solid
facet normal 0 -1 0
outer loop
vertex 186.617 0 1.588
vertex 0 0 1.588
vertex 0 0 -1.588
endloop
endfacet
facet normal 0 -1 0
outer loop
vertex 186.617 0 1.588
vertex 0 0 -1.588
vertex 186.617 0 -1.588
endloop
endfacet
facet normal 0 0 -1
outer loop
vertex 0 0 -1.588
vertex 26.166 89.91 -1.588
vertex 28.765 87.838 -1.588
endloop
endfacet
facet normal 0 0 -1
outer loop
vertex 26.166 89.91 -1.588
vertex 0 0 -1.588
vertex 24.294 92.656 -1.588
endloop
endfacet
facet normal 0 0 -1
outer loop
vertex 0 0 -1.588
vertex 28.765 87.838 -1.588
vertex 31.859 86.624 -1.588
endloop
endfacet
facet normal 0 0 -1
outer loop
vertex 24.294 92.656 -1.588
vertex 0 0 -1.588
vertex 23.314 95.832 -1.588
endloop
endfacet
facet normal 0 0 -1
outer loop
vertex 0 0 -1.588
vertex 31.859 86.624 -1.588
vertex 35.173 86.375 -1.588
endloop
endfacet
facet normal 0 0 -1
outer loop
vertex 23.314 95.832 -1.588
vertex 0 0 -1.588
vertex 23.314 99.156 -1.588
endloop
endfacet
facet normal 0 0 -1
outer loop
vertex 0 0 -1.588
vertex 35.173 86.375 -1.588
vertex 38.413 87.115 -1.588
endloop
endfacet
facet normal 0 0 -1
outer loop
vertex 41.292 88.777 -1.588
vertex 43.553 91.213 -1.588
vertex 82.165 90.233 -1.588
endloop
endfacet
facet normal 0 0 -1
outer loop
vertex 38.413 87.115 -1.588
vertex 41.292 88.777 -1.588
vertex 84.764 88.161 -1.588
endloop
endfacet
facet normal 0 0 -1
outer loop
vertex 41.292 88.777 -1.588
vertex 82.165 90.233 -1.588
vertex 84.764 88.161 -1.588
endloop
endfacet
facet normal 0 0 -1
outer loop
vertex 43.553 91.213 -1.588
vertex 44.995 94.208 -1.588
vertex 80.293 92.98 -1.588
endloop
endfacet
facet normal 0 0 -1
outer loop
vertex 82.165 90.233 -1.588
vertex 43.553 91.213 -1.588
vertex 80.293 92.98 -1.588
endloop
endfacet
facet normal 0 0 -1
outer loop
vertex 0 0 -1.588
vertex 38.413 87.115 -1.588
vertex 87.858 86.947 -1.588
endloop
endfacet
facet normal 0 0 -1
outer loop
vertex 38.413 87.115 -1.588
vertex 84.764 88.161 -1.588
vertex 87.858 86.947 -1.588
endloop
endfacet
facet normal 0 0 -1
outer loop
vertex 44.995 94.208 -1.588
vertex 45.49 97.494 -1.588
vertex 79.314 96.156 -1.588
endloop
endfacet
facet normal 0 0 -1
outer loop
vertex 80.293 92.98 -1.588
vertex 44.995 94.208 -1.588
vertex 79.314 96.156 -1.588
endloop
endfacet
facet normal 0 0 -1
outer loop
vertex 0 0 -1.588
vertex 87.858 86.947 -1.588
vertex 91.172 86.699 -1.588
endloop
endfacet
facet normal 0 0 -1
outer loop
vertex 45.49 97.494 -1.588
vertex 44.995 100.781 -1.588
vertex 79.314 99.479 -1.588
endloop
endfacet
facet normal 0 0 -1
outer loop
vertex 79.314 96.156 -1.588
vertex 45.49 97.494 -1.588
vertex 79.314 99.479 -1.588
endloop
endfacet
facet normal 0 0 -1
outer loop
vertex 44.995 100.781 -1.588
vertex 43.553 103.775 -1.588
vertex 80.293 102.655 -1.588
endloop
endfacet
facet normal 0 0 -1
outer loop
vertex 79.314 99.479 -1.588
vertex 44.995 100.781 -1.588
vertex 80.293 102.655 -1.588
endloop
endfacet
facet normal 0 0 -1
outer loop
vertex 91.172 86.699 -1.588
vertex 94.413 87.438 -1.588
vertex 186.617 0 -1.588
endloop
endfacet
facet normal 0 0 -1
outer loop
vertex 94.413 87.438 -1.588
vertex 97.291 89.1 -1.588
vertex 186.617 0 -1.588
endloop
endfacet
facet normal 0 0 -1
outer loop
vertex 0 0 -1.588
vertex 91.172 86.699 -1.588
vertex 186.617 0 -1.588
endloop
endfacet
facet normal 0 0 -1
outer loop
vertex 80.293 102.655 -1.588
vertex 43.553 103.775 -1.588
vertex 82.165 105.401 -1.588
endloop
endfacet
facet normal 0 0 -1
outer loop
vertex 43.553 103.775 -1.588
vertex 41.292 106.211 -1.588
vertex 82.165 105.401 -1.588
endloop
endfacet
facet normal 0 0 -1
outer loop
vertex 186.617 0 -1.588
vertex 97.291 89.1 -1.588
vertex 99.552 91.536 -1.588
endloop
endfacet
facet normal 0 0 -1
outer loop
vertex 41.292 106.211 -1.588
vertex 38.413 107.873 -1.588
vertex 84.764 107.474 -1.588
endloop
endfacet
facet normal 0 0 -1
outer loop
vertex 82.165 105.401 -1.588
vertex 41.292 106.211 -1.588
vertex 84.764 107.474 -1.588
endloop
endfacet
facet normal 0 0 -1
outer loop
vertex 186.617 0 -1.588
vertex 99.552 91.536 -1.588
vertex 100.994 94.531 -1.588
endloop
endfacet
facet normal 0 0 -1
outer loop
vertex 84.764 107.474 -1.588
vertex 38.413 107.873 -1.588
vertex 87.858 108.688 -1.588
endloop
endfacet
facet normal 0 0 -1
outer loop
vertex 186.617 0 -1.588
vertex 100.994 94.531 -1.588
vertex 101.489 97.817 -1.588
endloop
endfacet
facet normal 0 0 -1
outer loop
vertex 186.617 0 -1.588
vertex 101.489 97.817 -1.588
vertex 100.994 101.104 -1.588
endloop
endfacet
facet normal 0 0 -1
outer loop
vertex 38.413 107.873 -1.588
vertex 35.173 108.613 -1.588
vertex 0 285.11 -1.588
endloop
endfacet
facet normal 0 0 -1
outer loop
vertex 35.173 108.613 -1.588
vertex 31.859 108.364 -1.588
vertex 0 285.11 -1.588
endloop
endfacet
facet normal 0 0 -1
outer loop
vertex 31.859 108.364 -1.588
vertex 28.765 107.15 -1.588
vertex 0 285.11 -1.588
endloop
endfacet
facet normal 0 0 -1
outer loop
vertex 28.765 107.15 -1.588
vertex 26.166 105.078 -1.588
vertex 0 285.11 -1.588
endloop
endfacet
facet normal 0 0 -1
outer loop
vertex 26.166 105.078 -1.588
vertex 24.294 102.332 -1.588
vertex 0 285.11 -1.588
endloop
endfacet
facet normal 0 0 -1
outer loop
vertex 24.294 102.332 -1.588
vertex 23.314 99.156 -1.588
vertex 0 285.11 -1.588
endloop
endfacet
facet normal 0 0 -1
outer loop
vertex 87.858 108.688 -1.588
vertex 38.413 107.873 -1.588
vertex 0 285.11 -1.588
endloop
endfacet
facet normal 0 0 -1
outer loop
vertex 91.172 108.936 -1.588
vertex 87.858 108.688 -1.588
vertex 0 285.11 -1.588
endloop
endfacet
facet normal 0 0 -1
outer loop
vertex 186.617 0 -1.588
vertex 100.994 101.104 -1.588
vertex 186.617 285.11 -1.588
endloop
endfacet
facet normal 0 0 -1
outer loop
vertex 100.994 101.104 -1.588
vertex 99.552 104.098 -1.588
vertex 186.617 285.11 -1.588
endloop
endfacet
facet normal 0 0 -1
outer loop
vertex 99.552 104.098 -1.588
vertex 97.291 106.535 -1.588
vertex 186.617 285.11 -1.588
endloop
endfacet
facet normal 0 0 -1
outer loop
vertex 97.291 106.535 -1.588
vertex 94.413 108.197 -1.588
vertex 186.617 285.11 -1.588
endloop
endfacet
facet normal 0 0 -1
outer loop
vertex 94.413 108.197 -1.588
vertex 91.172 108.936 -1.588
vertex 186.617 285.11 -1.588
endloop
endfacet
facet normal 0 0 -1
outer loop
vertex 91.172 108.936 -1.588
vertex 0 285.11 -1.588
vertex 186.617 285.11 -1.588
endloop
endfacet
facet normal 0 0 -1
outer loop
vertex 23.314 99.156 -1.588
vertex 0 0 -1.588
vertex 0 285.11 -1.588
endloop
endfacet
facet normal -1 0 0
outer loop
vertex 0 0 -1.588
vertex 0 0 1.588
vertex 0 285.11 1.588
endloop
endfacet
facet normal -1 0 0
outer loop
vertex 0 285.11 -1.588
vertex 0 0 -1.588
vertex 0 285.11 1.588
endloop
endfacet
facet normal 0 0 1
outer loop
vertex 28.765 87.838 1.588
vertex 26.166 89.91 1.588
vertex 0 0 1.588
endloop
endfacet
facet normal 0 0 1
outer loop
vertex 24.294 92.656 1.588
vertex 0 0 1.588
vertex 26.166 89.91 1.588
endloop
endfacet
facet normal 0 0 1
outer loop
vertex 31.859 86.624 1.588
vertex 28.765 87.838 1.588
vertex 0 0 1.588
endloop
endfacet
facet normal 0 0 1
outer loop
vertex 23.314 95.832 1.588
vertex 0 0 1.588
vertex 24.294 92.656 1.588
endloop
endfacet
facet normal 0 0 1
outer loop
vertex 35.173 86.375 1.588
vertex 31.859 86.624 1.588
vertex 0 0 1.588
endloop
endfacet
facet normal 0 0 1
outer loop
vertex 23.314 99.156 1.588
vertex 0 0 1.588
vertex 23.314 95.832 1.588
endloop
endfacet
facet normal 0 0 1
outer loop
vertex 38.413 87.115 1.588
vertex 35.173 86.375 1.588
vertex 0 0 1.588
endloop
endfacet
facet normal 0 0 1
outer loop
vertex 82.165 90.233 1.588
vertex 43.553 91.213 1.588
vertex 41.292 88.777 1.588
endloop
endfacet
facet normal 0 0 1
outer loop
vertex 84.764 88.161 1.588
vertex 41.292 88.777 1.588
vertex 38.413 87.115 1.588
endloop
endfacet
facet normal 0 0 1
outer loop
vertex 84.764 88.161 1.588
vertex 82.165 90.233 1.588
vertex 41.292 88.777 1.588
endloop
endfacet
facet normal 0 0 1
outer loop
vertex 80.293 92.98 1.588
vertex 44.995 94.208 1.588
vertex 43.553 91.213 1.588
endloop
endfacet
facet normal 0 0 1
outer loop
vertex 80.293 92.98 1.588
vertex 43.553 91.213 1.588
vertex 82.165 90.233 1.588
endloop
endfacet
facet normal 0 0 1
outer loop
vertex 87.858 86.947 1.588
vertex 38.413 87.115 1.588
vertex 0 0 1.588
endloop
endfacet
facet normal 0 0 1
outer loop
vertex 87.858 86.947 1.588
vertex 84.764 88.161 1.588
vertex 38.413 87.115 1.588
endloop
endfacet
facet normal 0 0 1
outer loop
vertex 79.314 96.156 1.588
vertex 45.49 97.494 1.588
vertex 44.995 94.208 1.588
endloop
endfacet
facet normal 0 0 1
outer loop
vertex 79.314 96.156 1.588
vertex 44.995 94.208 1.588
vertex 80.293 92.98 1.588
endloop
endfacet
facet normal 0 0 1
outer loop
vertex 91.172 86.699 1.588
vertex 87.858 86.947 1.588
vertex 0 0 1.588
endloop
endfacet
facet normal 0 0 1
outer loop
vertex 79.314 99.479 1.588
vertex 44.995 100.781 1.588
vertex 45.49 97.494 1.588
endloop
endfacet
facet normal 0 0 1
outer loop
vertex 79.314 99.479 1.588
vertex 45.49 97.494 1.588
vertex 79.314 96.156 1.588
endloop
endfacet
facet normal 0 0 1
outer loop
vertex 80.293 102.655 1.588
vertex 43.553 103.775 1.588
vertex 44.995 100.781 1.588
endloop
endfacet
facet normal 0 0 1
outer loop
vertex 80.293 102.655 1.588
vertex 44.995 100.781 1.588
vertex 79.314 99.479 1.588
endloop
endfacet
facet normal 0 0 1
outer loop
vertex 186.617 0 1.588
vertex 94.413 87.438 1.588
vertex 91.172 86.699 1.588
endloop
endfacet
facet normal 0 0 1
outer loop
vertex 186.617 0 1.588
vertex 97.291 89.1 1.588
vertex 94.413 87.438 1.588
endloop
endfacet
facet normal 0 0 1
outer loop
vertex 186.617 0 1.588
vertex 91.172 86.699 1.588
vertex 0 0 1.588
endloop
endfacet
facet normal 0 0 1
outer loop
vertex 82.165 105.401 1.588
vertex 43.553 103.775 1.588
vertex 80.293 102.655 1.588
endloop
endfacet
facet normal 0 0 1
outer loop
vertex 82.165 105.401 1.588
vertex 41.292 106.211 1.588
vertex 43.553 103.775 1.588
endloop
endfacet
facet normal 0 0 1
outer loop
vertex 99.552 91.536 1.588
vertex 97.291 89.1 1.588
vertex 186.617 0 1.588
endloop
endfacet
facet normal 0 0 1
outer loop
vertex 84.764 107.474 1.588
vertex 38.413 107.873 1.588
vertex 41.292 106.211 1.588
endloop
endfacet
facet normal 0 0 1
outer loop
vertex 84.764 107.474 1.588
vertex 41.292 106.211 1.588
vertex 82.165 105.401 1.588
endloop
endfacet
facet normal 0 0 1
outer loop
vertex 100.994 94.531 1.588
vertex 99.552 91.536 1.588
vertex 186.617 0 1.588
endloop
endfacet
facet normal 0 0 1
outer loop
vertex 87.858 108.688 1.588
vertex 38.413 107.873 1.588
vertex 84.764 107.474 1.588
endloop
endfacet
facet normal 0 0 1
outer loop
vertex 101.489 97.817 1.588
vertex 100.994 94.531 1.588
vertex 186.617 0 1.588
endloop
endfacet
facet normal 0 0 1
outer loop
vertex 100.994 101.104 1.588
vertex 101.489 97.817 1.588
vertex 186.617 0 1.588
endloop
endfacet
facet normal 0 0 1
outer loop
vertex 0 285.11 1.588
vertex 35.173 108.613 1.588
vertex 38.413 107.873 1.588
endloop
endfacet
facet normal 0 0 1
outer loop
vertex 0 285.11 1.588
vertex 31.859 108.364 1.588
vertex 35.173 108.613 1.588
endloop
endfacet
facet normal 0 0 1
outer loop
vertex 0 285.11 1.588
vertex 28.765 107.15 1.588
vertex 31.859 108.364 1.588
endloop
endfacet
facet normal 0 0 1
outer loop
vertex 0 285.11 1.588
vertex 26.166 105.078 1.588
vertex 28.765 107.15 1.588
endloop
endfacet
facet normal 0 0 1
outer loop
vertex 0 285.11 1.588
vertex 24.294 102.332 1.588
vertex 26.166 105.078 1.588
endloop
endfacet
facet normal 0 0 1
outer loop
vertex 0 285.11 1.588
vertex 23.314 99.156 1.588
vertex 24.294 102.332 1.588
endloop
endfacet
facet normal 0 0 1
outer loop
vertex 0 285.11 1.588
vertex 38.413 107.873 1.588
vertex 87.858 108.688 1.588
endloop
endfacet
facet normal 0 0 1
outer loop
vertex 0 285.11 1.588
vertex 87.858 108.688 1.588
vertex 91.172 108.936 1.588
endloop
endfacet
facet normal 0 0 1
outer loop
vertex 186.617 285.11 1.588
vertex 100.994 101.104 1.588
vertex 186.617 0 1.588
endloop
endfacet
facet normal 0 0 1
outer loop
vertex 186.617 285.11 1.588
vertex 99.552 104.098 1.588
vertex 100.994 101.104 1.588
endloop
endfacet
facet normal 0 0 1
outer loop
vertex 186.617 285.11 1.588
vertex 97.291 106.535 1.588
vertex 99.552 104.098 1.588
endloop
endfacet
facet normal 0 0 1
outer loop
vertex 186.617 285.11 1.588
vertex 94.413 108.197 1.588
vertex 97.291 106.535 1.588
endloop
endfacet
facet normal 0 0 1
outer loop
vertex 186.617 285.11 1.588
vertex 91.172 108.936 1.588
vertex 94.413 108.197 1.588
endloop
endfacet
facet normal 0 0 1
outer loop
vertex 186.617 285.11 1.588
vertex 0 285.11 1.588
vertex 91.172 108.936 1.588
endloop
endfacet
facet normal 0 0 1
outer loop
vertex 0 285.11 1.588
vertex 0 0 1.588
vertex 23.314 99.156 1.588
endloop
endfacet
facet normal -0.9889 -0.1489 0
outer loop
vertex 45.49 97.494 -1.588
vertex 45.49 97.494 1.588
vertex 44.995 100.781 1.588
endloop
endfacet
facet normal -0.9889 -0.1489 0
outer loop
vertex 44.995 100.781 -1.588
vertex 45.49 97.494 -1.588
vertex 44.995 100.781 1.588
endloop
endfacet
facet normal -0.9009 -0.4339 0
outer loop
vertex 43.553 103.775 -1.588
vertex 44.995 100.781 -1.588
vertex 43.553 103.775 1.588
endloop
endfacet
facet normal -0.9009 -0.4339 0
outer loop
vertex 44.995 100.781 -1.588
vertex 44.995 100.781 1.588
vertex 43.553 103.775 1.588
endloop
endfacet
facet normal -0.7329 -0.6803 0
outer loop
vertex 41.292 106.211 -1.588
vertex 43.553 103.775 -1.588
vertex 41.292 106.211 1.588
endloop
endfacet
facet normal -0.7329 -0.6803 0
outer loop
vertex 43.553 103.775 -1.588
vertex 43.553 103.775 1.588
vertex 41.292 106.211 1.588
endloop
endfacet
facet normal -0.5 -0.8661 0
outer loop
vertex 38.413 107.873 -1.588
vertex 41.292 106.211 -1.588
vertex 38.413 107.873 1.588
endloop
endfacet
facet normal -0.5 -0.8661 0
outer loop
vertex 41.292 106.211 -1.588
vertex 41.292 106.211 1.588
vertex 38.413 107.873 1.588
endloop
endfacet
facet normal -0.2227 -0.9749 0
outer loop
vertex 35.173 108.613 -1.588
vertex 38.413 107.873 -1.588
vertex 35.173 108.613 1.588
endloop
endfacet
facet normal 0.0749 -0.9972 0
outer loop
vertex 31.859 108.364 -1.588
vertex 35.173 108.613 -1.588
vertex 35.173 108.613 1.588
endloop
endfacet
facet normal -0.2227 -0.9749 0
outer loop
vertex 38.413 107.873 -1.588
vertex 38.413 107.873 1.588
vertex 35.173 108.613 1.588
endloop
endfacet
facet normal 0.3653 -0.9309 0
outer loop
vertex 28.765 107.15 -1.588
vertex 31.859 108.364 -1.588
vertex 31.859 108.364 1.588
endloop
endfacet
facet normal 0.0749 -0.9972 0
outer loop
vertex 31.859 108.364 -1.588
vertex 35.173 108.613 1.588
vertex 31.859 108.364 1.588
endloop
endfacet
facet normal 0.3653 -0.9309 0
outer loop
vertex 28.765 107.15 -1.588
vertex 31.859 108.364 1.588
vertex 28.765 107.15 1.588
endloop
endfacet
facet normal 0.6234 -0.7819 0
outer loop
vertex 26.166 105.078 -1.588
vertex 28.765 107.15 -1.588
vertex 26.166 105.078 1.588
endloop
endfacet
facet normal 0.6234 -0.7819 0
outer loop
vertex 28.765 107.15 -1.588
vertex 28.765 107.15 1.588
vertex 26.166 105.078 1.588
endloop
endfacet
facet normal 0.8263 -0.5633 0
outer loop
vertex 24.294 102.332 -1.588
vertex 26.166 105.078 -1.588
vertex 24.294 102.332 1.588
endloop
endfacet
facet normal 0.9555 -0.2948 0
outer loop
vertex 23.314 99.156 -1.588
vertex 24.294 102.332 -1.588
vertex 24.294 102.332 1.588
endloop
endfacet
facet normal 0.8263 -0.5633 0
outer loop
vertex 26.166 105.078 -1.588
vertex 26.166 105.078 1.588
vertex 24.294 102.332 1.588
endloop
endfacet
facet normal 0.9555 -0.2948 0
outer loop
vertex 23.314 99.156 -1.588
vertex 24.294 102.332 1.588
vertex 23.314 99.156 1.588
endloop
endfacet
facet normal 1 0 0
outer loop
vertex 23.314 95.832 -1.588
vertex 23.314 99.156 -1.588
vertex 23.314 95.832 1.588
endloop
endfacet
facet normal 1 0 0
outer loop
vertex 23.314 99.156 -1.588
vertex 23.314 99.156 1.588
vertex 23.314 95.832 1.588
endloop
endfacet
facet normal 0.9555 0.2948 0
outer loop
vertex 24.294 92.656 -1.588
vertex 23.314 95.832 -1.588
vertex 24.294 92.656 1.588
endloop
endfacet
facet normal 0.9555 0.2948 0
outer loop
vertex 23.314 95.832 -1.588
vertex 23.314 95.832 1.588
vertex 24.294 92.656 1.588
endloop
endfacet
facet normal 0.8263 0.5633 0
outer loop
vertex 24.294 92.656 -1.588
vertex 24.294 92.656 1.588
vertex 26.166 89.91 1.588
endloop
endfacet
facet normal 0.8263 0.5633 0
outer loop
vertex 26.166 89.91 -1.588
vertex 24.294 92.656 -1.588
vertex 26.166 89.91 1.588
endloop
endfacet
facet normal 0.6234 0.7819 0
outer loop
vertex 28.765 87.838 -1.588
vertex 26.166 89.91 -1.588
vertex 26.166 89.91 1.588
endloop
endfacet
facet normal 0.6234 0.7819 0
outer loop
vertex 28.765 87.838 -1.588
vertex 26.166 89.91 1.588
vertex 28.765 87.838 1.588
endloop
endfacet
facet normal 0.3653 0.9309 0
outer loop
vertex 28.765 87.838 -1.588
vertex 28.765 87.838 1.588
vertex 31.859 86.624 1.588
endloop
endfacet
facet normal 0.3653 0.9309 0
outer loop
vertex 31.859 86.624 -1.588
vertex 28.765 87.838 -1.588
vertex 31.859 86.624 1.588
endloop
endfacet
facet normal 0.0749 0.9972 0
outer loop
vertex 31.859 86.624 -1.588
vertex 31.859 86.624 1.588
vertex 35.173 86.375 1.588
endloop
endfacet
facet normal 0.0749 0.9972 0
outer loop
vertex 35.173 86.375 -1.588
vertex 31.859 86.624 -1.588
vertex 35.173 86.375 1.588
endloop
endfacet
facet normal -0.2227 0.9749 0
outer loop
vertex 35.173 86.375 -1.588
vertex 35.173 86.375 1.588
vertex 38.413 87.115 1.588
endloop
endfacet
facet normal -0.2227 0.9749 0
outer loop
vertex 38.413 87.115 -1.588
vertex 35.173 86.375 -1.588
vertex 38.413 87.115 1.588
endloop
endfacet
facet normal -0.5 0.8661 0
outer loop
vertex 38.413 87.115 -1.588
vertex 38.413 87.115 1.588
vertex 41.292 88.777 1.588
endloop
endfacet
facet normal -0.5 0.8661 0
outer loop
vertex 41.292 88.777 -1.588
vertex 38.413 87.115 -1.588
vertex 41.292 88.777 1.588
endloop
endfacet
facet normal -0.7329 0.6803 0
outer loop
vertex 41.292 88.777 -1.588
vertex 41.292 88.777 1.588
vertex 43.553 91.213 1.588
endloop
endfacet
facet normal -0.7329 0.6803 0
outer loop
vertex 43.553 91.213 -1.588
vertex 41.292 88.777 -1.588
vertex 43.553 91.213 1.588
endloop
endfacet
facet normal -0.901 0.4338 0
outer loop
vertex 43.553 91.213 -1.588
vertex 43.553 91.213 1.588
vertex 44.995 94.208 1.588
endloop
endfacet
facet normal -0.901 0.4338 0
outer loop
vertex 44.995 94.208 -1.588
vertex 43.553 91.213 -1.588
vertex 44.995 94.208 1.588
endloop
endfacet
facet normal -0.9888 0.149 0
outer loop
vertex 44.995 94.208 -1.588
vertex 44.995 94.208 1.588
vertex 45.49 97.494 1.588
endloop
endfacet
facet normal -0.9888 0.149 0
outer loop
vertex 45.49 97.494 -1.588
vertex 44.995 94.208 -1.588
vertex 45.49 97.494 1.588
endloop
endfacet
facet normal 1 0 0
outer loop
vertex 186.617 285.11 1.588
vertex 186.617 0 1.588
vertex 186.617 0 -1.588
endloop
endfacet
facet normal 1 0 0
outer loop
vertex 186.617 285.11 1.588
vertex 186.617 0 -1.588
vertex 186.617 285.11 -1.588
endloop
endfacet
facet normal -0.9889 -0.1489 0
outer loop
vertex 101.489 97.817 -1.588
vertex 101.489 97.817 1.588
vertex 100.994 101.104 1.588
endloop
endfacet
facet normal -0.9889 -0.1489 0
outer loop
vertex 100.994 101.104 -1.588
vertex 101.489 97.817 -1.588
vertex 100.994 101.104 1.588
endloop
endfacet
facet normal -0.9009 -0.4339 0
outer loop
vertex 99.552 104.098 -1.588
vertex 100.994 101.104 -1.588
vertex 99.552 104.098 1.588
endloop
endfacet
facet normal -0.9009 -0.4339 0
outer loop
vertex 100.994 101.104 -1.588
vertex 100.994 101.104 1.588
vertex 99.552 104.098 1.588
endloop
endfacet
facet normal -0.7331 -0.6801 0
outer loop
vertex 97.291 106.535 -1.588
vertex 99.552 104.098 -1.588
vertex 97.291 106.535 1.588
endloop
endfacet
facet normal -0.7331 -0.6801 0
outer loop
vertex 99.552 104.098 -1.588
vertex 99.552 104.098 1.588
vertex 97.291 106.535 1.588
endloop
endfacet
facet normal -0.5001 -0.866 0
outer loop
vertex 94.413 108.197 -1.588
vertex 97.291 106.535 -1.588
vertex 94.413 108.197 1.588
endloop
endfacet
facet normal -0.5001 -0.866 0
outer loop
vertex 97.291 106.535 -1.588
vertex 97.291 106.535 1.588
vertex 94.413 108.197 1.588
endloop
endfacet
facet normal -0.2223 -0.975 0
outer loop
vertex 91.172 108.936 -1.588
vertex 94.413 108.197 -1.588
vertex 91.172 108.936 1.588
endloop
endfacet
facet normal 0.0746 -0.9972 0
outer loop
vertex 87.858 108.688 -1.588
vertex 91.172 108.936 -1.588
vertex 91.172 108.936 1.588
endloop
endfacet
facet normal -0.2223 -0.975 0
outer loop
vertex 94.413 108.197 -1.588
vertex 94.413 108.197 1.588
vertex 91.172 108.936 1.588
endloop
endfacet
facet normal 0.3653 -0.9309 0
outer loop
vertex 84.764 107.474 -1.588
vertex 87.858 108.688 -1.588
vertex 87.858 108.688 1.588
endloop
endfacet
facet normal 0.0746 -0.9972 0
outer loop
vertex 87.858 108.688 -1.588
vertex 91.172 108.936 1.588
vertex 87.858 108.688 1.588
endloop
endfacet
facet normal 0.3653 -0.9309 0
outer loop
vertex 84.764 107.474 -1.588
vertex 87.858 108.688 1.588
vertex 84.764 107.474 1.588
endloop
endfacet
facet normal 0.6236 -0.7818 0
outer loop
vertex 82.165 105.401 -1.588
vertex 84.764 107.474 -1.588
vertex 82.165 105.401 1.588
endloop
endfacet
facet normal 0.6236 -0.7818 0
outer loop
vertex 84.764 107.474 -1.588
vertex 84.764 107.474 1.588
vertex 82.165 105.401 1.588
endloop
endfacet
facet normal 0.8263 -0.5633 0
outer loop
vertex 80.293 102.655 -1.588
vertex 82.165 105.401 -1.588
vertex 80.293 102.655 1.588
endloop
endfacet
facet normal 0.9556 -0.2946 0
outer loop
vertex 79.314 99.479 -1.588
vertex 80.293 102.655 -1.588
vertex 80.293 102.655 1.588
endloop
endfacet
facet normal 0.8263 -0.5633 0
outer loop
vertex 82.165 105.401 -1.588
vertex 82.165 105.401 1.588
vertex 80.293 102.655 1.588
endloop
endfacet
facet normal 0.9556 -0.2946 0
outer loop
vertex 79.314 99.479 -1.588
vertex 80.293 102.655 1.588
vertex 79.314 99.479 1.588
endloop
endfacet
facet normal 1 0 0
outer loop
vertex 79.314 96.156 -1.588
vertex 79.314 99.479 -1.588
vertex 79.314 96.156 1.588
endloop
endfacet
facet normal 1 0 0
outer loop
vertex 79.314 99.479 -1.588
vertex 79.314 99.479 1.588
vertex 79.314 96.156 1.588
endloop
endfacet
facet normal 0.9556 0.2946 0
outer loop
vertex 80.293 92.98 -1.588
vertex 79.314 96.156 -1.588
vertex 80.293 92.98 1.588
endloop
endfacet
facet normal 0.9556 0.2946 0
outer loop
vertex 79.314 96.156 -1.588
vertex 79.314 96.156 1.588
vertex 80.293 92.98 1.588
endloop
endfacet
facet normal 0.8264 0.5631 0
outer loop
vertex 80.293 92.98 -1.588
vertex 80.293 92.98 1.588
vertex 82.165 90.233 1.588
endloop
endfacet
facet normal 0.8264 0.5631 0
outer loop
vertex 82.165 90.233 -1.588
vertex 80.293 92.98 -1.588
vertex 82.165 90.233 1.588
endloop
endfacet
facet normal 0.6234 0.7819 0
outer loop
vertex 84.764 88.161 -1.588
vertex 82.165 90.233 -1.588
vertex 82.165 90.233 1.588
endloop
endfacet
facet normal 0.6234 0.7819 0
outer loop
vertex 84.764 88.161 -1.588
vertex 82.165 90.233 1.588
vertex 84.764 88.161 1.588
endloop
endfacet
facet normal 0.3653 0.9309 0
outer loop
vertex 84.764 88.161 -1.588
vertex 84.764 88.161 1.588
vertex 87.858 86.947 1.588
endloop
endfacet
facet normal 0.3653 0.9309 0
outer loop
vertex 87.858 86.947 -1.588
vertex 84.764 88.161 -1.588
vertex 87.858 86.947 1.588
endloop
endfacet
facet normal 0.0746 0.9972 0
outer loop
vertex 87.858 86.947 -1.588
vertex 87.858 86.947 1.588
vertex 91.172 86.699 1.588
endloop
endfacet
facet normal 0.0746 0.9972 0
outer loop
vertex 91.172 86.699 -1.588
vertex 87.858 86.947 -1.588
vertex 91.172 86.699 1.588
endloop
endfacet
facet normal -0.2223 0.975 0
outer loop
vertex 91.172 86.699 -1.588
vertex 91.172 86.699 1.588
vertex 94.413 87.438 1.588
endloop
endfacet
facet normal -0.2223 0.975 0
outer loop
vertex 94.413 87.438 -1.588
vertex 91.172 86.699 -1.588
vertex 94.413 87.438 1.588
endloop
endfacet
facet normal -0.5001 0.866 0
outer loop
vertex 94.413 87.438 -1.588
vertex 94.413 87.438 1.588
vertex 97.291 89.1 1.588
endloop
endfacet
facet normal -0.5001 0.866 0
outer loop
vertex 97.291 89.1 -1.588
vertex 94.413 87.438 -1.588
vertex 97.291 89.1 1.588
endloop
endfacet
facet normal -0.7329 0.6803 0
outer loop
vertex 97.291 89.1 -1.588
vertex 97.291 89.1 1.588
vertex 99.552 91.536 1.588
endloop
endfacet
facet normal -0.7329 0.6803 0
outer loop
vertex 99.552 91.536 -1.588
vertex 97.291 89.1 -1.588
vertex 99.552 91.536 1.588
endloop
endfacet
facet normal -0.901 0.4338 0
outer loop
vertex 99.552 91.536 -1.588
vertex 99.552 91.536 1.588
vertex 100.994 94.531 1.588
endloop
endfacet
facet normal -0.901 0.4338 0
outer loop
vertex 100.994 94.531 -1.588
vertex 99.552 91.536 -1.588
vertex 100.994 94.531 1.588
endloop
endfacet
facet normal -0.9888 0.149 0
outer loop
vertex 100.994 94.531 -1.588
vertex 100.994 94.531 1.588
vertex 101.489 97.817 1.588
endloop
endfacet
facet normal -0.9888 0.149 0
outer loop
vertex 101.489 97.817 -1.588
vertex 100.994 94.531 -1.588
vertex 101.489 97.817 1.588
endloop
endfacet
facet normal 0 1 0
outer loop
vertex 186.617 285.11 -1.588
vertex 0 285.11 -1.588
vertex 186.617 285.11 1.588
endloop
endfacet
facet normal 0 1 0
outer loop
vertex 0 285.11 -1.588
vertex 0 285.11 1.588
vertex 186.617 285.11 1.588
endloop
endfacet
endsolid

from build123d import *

# Parameters (mm, degrees)
SKETCH1_W           = 186.616953842
SKETCH1_H           = 285.110155161
BOSS_EXTRUDE1_DEPTH = 1.5875
SKETCH2_R           = 11.15
CUT_EXTRUDE1_DEPTH  = 4.175


with BuildPart() as part:
    # Sketch1 → Boss-Extrude1 (new body, symmetric)
    with BuildSketch(Plane.XY):
        with Locations((93.308476921, 142.555077581)):
            Rectangle(SKETCH1_W, SKETCH1_H)
    extrude(amount=BOSS_EXTRUDE1_DEPTH, both=True)

    # Sketch2 → Cut-Extrude1 (cut, through all)
    with BuildSketch(Plane.XY.offset(1.5875)):
        with Locations((90.33901258, 97.817400981)):
            Circle(SKETCH2_R)
        with Locations((34.339946259, 97.494026403)):
            Circle(SKETCH2_R)
    extrude(amount=-CUT_EXTRUDE1_DEPTH, mode=Mode.SUBTRACT)


solid = part.part
